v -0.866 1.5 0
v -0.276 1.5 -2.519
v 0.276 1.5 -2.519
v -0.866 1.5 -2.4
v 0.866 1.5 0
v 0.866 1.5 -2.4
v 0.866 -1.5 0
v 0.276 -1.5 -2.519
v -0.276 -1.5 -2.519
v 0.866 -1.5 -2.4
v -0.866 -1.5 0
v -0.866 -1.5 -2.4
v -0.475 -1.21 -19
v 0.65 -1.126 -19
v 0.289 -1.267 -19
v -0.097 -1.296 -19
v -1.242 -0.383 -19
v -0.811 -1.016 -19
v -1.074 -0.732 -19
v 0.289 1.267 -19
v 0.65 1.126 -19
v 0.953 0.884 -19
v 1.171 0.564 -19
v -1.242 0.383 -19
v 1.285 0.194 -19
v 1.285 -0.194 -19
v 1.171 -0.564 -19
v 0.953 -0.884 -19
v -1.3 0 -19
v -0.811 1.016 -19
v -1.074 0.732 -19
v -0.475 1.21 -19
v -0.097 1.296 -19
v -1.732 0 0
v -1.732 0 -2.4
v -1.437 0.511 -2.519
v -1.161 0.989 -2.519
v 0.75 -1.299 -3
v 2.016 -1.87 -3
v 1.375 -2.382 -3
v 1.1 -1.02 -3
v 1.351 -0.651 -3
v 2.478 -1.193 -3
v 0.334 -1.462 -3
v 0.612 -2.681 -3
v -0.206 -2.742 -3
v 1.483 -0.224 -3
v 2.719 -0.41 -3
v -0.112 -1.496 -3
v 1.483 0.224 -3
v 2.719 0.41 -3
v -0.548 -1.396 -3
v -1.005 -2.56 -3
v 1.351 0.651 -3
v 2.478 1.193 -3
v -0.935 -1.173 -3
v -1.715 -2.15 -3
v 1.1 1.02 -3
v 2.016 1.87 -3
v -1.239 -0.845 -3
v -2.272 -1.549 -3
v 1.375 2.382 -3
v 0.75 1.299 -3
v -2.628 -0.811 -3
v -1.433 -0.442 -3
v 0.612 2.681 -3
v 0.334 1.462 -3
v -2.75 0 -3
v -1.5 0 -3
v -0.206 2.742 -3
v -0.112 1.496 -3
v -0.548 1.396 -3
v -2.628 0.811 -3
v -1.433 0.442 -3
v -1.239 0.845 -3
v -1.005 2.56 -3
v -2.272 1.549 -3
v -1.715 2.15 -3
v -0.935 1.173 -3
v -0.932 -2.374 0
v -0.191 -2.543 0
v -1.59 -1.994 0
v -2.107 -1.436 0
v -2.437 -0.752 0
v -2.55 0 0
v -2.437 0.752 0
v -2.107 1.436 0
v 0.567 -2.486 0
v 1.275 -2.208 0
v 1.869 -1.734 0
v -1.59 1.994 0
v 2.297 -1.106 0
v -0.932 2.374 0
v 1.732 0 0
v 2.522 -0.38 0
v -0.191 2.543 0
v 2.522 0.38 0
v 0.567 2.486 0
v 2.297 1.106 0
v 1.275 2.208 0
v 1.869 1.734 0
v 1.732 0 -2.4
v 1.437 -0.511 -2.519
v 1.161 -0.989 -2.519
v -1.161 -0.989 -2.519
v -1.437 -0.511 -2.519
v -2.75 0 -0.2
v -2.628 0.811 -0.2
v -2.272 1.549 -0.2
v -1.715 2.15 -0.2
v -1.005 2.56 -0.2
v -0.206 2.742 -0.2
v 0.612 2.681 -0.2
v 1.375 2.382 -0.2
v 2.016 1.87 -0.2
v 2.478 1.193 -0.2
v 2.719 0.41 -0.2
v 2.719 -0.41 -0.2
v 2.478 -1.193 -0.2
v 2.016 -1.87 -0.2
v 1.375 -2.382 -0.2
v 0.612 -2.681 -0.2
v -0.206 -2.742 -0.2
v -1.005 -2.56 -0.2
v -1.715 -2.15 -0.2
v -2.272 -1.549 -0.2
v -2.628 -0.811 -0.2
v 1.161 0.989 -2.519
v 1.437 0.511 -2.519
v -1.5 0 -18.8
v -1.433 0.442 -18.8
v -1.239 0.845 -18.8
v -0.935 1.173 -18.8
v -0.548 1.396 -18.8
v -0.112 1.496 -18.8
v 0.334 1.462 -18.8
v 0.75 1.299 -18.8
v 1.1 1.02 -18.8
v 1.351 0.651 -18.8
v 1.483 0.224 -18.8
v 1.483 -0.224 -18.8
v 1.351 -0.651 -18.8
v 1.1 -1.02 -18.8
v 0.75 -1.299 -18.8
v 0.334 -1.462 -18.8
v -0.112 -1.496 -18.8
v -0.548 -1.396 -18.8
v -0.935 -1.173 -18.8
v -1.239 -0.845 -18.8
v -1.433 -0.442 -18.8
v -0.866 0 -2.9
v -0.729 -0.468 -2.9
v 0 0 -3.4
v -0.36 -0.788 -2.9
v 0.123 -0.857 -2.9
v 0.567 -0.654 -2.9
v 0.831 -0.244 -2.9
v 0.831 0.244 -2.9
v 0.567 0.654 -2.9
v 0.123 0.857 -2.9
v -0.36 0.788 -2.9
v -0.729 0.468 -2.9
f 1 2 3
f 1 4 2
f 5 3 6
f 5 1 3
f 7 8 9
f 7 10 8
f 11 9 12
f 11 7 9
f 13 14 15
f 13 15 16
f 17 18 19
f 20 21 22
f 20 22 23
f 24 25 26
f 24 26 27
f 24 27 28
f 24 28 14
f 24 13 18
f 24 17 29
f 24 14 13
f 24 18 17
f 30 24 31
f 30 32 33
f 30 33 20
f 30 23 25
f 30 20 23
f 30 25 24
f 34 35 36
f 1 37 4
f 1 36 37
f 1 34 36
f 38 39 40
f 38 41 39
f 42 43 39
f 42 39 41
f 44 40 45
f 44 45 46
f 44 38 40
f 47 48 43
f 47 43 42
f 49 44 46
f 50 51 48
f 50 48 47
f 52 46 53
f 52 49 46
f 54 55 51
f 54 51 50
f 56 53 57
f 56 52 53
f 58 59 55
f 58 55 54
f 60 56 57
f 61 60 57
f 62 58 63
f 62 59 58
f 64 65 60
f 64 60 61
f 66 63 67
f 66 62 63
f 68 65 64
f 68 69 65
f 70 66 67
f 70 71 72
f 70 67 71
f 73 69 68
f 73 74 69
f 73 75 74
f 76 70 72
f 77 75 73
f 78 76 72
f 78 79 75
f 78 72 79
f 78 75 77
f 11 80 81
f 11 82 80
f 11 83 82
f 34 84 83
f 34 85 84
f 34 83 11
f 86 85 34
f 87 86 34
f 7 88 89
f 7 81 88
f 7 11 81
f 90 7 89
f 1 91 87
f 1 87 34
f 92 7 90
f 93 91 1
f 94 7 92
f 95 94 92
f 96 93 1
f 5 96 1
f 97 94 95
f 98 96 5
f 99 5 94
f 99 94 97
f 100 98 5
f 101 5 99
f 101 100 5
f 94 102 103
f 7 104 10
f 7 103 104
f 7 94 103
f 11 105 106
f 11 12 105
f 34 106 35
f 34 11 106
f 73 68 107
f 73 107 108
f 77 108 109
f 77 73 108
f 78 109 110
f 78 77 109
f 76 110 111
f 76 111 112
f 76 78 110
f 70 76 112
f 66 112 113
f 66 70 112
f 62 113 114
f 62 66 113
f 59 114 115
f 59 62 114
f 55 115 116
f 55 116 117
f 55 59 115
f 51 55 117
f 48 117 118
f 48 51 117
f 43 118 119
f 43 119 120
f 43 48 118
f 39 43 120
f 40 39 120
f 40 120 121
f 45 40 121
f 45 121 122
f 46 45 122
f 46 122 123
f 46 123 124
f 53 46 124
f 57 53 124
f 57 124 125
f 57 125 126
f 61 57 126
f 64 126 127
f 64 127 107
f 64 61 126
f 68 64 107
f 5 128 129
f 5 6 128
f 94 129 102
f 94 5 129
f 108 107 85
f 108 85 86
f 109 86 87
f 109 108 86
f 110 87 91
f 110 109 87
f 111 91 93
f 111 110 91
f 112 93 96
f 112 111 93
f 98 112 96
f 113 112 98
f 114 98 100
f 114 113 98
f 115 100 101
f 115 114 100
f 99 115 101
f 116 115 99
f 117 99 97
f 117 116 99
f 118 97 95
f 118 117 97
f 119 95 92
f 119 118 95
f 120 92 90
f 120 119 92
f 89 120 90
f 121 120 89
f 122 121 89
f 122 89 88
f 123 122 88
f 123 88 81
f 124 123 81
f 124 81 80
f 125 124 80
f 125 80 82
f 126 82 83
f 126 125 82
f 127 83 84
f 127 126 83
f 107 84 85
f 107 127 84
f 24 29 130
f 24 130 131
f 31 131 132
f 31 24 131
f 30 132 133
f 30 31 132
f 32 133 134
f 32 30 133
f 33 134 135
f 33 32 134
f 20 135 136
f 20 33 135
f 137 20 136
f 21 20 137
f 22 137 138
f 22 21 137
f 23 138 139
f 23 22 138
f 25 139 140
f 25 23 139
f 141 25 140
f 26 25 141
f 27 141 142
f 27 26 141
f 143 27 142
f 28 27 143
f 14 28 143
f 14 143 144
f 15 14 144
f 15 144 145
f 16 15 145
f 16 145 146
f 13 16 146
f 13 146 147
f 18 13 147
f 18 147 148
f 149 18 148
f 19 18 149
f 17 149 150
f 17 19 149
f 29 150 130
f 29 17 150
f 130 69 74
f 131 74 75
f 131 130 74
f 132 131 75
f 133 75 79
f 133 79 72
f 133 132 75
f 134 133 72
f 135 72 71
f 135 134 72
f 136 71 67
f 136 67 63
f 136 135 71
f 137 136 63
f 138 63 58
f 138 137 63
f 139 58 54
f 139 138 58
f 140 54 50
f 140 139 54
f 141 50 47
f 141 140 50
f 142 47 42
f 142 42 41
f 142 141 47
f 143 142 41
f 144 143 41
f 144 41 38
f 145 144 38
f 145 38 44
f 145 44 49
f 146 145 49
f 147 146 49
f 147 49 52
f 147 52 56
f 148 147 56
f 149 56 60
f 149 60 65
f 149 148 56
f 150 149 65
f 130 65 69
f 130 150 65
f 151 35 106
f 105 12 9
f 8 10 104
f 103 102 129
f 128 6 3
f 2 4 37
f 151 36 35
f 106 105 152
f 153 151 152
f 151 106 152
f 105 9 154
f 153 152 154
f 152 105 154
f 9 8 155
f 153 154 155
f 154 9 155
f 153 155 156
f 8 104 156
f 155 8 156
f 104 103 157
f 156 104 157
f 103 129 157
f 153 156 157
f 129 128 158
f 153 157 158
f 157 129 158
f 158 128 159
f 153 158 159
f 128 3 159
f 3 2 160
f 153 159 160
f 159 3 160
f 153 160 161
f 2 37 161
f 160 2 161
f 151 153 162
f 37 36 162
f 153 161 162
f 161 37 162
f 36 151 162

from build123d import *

# Parameters (mm, degrees)
CHAMFER_1_SIZE      = 0.2
CHAMFER_2_SIZE      = 0.2
CUT_EXTRUDE_1_DEPTH = 2.4
EXTRUDE_2_REACH     = 21.394
SKETCH_4_R          = 1.832050808


with BuildPart() as part:
    # Sketch S → Revolve D (revolve)
    with BuildSketch(Plane(origin=(0, 0, 0), x_dir=(-1, 0, 0), z_dir=(0, 1, 0))):
        Polygon((0, 0), (2.75, 0), (2.75, -3), (1.5, -3), (1.5, -19), (0, -19), align=None)
    revolve(axis=Axis((0, 0, 20), (0, 0, -1)))

    # 面取り1
    chamfer_1_edges = [part.edges().sort_by_distance(p)[0] for p in [
        (2.75, 0, 0),
    ]]
    chamfer(chamfer_1_edges, length=CHAMFER_1_SIZE)

    # 面取り2
    chamfer_2_edges = [part.edges().sort_by_distance(p)[0] for p in [
        (1.5, 0, -19),
    ]]
    chamfer(chamfer_2_edges, length=CHAMFER_2_SIZE)

    # ｽｹｯﾁ2 → ｶｯﾄ - 押し出し1 (cut)
    with BuildSketch(Plane(origin=(0, 0, 0), x_dir=(0, 1, 0), z_dir=(0, 0, 1))):
        Polygon((0, 1.732050808), (1.5, 0.866025404), (1.5, -0.866025404), (0, -1.732050808), (-1.5, -0.866025404), (-1.5, 0.866025404), align=None)
    extrude(amount=-CUT_EXTRUDE_1_DEPTH, mode=Mode.SUBTRACT)

    # ｽｹｯﾁ3 → ｶｯﾄ - 回転1 (revolve, cut)
    with BuildSketch(Plane(origin=(0, 0, 0), x_dir=(1, 0, 0), z_dir=(0, 1, 0))):
        Polygon((-1.832050808, 0), (0, 0), (0, 3.4), (-1.832050808, 2.342264973), align=None)
    revolve(axis=Axis((0, 0, -30.07825812), (0, 0, 1)), mode=Mode.SUBTRACT)

    # ｽｹｯﾁ4 → ﾎﾞｽ - 押し出し2 (add, up to next)
    with BuildSketch(Plane.XY, mode=Mode.PRIVATE) as extrude_2_sk1:
        Circle(SKETCH_4_R)
        Polygon((-1.732050808, 0), (-0.866025404, 1.5), (0.866025404, 1.5), (1.732050808, 0), (0.866025404, -1.5), (-0.866025404, -1.5), align=None, mode=Mode.SUBTRACT)
    extrude_2_tool1 = extrude(extrude_2_sk1.sketch, amount=-EXTRUDE_2_REACH, mode=Mode.PRIVATE) - part.part
    add(extrude_2_tool1.solids().sort_by_distance((-1.780233, 0, 0))[0])


solid = part.part
